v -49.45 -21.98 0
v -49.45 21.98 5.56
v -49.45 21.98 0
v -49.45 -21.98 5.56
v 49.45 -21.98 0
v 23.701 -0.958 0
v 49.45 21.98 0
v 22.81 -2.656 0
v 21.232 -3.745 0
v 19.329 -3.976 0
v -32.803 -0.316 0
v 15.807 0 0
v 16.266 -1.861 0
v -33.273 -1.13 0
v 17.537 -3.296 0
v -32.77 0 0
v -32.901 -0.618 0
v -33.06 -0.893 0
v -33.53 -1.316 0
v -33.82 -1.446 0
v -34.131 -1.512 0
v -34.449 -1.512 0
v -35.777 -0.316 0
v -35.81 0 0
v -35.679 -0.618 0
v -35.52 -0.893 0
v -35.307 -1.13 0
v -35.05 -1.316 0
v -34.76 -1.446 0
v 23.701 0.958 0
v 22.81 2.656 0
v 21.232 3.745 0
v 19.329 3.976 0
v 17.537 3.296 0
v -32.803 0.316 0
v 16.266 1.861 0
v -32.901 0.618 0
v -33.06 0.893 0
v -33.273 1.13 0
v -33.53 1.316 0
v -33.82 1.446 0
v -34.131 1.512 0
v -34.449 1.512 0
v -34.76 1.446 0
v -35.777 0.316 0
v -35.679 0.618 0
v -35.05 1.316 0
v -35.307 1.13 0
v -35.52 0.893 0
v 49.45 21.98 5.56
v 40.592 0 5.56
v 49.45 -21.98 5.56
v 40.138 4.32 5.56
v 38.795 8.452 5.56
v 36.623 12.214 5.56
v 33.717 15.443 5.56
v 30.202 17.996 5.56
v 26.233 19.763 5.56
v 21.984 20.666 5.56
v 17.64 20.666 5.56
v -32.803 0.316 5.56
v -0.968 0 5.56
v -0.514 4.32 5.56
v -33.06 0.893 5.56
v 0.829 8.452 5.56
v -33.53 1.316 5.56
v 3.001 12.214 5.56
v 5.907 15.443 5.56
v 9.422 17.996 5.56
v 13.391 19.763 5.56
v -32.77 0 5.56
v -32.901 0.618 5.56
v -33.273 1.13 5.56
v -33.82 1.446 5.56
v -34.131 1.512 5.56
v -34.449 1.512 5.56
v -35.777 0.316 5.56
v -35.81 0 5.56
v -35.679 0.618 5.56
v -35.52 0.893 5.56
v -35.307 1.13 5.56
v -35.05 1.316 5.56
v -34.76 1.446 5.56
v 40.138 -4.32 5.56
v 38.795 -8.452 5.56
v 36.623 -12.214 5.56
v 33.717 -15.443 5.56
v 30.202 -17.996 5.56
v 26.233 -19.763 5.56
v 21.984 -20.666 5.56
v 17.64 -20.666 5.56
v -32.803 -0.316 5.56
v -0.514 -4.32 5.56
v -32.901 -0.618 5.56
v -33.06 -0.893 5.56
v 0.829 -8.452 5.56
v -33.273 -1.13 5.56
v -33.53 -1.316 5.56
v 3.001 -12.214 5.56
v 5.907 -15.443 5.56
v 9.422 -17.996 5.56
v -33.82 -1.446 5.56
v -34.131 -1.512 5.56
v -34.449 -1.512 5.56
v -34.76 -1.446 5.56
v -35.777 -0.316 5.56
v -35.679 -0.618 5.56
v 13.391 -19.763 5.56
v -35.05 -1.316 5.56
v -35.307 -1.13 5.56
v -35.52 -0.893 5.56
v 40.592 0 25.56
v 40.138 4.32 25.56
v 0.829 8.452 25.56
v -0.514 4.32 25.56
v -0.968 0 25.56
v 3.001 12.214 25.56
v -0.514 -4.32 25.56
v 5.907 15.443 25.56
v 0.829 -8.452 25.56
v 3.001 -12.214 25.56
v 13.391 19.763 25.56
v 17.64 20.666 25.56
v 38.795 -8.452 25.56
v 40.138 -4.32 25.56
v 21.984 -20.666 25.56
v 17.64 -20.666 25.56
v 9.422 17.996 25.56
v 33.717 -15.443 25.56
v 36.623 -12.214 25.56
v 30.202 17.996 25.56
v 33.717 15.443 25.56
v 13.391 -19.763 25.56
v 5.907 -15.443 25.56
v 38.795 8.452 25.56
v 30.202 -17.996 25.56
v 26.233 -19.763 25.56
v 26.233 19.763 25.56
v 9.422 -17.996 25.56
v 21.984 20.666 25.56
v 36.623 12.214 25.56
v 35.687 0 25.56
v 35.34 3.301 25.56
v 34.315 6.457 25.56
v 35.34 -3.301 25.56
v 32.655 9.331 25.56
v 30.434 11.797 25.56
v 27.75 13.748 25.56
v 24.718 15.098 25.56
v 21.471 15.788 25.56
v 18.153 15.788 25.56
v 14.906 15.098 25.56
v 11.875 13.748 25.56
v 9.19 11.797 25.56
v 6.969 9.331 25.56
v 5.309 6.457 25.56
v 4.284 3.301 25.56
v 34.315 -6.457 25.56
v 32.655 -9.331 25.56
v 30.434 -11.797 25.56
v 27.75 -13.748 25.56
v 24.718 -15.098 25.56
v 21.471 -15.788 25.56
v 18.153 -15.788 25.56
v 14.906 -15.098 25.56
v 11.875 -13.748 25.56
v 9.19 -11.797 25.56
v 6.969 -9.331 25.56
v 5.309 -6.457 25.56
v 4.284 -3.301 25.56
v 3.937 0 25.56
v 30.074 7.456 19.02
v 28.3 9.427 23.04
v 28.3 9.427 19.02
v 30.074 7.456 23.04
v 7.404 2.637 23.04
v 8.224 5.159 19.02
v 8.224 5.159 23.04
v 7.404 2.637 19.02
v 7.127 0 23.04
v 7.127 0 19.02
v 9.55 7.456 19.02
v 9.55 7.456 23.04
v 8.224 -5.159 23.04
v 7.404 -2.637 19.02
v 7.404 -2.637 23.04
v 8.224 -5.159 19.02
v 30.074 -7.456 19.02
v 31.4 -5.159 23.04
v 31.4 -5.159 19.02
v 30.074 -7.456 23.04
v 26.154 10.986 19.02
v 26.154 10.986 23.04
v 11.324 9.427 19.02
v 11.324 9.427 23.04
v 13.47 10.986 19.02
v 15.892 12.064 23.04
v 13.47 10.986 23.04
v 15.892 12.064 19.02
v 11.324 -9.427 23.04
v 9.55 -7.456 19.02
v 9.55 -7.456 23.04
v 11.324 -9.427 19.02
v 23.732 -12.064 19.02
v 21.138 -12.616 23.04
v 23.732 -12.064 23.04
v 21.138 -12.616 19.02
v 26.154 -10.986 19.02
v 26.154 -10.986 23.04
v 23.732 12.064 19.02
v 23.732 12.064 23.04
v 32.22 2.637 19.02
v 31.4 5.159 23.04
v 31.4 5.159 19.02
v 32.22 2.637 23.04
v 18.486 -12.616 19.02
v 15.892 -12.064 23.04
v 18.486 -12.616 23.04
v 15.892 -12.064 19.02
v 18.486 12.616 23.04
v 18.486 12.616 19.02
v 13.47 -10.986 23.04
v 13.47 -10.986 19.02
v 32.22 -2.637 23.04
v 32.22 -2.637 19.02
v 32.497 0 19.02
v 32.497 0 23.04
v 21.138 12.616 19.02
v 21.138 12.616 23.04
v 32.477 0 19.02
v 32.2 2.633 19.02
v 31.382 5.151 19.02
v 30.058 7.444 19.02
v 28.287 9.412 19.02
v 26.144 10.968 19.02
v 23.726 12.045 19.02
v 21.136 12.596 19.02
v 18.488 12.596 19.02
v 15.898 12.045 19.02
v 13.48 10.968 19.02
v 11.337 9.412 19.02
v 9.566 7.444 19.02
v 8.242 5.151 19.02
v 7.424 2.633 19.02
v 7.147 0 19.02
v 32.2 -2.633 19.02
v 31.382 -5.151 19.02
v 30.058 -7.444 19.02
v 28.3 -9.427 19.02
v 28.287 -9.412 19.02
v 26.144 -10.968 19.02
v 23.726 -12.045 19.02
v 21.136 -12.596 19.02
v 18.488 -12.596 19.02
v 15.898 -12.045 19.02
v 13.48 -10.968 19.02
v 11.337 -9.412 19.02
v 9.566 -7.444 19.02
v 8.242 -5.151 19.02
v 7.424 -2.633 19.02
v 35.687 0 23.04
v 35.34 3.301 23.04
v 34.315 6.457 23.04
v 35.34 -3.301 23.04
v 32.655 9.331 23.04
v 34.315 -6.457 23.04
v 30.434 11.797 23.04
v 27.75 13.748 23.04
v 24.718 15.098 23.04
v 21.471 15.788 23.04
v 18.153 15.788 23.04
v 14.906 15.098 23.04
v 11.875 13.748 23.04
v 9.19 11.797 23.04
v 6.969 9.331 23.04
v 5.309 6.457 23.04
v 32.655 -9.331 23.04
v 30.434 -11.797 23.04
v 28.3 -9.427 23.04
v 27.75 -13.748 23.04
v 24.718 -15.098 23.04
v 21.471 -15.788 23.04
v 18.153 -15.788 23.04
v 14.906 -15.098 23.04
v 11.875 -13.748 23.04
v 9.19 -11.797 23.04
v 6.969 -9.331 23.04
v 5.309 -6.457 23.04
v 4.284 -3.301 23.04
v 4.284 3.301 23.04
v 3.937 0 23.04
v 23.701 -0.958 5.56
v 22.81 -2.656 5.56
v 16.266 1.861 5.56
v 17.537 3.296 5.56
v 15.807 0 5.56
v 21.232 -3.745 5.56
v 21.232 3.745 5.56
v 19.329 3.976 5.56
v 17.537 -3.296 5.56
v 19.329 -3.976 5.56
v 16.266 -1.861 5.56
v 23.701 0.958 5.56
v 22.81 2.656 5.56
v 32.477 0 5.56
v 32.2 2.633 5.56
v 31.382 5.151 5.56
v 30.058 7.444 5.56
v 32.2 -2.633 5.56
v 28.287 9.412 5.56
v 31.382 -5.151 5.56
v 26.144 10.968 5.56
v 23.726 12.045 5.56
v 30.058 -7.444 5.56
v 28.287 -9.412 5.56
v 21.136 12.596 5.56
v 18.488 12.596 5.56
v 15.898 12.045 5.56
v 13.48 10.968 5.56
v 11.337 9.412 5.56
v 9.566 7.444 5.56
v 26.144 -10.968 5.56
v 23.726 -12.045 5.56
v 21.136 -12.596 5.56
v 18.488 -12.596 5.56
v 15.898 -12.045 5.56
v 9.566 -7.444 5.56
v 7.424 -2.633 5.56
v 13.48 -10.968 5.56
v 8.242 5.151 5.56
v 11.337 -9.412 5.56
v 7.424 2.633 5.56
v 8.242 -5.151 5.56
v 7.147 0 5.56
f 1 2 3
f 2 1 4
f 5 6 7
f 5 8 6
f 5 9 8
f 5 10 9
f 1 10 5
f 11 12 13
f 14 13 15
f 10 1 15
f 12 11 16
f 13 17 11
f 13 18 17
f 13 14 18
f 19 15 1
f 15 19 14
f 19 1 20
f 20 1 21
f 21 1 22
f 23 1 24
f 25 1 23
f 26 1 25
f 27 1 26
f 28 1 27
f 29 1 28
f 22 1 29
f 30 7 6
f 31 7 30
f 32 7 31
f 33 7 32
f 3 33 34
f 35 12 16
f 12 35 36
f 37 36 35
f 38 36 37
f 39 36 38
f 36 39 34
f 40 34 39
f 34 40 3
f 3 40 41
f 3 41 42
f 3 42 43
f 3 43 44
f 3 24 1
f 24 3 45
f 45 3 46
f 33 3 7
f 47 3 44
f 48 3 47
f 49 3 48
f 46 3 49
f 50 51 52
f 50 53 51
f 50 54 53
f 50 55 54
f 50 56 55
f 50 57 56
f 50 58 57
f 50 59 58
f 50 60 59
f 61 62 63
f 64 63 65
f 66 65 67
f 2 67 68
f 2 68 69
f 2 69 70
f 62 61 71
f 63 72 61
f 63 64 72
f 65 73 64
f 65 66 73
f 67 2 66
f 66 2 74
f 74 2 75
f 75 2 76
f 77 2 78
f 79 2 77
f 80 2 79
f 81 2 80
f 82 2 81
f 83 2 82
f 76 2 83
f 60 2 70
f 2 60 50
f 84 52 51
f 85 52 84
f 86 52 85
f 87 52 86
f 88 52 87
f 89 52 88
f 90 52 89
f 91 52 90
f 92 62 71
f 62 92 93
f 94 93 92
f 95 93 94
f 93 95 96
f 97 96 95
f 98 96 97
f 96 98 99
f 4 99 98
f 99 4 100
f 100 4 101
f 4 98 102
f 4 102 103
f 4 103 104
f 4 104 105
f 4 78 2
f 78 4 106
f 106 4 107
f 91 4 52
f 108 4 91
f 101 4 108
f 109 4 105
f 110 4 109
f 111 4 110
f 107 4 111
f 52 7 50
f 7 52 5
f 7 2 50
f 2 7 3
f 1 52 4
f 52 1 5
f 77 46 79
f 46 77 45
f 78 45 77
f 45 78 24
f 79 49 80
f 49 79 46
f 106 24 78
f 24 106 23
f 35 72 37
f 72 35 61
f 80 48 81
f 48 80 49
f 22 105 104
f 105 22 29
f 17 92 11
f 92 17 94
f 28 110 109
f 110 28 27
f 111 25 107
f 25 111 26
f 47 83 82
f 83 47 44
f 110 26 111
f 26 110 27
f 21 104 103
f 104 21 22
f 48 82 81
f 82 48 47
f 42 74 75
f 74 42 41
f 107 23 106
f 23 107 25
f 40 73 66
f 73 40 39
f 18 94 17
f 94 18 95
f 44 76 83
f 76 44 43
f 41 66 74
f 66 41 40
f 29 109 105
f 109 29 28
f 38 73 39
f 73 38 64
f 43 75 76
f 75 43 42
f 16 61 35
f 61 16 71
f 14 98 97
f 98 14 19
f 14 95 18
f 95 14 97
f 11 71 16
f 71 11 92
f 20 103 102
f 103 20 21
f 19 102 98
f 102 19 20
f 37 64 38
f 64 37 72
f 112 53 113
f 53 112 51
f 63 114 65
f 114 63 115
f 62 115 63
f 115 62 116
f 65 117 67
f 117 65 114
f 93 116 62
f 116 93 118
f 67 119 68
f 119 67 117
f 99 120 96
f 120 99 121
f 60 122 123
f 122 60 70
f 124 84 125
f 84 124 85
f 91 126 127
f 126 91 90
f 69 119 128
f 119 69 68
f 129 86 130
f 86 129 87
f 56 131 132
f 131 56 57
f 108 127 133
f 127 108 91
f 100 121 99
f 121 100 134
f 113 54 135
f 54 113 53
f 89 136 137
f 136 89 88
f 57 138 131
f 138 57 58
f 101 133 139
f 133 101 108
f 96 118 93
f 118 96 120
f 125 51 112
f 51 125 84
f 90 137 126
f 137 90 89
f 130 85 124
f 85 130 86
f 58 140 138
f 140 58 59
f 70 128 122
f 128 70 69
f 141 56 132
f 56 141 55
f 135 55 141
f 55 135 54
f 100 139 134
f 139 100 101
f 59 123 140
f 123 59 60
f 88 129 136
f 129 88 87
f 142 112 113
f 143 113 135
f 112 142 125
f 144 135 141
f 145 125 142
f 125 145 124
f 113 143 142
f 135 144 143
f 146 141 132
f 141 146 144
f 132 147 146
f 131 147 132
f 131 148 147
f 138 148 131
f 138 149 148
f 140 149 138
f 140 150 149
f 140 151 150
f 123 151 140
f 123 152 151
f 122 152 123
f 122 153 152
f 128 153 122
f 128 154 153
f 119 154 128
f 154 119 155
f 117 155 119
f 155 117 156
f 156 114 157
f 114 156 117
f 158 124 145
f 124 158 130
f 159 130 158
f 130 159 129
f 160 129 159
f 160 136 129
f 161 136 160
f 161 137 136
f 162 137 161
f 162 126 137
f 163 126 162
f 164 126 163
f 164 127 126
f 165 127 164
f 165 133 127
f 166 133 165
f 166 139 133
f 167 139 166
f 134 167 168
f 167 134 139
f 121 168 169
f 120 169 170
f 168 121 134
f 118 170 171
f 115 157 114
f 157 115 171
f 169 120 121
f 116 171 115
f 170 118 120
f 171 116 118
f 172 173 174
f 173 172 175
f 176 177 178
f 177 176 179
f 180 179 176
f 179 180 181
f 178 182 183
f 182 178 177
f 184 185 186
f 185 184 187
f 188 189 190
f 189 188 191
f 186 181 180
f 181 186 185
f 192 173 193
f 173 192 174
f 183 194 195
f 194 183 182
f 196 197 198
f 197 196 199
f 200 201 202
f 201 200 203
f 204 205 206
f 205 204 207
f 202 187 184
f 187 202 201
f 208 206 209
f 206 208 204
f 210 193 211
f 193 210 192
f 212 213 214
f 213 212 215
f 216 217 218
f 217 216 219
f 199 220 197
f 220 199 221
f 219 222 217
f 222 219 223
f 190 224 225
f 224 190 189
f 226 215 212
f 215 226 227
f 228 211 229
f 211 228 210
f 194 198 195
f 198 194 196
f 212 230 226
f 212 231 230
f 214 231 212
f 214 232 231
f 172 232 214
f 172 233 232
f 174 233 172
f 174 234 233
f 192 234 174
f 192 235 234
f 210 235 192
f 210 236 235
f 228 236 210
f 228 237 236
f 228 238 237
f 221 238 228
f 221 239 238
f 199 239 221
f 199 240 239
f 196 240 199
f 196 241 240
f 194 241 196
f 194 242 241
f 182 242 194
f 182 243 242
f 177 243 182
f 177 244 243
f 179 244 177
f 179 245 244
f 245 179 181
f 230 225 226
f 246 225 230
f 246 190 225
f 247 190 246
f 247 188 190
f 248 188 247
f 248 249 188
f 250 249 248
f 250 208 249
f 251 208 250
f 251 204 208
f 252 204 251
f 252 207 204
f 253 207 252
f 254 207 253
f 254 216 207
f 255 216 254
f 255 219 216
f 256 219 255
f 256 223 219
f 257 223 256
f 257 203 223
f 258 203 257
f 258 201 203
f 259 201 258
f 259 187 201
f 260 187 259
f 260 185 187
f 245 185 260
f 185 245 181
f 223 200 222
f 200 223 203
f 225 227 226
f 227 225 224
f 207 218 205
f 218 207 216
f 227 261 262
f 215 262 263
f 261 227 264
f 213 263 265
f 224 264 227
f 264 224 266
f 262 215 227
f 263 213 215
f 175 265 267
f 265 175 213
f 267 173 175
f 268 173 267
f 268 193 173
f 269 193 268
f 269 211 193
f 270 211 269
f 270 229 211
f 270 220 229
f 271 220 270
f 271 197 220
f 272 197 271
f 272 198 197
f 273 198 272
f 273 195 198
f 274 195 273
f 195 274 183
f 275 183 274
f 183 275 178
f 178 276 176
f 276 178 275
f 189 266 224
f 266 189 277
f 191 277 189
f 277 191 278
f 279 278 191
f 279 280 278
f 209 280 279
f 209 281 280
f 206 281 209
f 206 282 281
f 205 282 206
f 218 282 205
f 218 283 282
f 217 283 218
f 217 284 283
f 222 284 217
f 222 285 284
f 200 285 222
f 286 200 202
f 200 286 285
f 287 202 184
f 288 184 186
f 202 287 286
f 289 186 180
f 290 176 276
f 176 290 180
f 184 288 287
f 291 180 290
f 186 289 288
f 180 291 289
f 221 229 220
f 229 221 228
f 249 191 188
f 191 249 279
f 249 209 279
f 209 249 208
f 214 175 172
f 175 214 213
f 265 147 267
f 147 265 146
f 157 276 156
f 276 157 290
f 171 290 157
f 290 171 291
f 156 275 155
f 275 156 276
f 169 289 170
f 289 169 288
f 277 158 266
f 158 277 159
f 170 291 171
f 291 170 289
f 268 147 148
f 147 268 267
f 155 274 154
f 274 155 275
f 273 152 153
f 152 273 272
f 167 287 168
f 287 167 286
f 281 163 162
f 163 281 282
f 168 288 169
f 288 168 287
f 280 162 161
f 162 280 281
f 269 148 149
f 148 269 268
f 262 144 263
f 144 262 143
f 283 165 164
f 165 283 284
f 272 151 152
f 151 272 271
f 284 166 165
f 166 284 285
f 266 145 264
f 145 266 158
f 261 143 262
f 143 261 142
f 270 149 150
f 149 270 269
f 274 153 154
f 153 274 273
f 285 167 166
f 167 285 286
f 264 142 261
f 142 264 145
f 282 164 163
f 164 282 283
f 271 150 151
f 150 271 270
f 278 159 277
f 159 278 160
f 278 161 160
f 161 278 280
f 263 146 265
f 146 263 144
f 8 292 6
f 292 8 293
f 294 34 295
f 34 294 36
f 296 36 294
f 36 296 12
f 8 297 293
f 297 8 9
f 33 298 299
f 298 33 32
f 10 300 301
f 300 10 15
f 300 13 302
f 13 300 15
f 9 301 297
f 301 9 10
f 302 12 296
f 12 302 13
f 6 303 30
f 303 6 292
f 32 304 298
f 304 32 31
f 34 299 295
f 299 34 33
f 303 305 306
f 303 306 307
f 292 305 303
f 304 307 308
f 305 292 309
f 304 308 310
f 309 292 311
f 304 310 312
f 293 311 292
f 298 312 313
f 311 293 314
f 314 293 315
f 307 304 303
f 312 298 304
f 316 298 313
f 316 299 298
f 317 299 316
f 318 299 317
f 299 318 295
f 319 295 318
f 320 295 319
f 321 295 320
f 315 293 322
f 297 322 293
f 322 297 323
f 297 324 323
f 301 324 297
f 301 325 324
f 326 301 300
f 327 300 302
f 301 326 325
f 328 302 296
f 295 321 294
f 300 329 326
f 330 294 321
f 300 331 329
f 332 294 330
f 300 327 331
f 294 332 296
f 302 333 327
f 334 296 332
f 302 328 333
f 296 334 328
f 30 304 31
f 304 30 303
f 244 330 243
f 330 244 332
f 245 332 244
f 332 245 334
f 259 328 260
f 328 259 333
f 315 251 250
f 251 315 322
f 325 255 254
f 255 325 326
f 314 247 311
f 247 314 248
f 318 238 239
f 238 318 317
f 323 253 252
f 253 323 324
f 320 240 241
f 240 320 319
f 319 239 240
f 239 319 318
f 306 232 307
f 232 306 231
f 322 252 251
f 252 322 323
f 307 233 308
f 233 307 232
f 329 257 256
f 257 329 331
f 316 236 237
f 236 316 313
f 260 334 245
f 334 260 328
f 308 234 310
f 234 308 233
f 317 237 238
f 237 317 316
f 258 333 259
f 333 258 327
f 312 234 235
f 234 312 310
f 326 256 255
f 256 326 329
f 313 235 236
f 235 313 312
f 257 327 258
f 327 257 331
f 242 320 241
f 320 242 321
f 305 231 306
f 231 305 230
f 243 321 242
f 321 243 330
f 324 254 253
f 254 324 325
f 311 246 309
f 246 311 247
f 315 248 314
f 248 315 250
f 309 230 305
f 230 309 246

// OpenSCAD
//Spec is 89.1 mm x 63.3 mm x 34.4 mm
//using slightly different numbers from engeneering diagram:
in2mm = 25.4;
specW = 3.5*in2mm;
specH = 1.337*in2mm;

//platform will be 10mm larger
platX = specW+10;
platY = specH+10;

//Location of lens from one side of specW
specLX = 0.970*in2mm;
specLY = 0.8*in2mm;

//slop for fittings (don't want it too tight), on each side
gap = 0.02;

//we will use the colimiting lens that screw into spec
specLensR = 7.97/2;
specLensH = 5.56;

//Can be used in standard nikkon camera mount 
mountR = 41.6/2;
//extra height (above the 2.52+4.02) nessesary for the camera mount so it can fit deeper into microscope mount
mountH = 20; //2.52+4.02;

//Or it can be fitted on camera mount with focus (press fit over screw)
module cameraMount(){
union() {
    translate([0,0,+2.52]) cylinder(4.02,(25.33/2)+gap,(25.33/2)+gap);
    cylinder(2.52,(31.71/2)+gap,(31.71/2)+gap);
  }
}

module platform(){
      //platform with holes cut out, taking into account 5mm on each side of platform
	difference(){
            cube(size=[platX, platY,specLensH], center=false);
            translate([3.1*in2mm+5,platY/2,0]) cylinder(specLensH,3/2+gap,3/2+gap, center=false, $fs=0.3);
            //translate([0.3*in2mm+5,platY/2,0]) cylinder(specLensH,3/2+gap,3/2+gap, center=false);
          }
}

//rotate to sit on platform
translate([19.81200,0,specLensH]) rotate([0,180,0]){
difference() {
  union() {
  //Set up so platform is above 0 Z, mounting clynders are below, and lens in over Z axes
      translate([-specLX-5, -(platY/2),0]) platform();
      //sets into nikon adapter
      translate([0,0,-mountH]) cylinder(mountH,mountR-gap,mountR-gap);
      //stabalise structure
      
    }
  //colimiting lens fits in
  cylinder(5.56,(7.97/2)+gap,(7.97/2)+gap);
  //subtract camera shape
  translate([0,0,-mountH]) cameraMount();
  //subtract lightpath
    translate([0,0,-(mountH)]) cylinder(mountH,(25.33/2),(25.33/2));
}
}
